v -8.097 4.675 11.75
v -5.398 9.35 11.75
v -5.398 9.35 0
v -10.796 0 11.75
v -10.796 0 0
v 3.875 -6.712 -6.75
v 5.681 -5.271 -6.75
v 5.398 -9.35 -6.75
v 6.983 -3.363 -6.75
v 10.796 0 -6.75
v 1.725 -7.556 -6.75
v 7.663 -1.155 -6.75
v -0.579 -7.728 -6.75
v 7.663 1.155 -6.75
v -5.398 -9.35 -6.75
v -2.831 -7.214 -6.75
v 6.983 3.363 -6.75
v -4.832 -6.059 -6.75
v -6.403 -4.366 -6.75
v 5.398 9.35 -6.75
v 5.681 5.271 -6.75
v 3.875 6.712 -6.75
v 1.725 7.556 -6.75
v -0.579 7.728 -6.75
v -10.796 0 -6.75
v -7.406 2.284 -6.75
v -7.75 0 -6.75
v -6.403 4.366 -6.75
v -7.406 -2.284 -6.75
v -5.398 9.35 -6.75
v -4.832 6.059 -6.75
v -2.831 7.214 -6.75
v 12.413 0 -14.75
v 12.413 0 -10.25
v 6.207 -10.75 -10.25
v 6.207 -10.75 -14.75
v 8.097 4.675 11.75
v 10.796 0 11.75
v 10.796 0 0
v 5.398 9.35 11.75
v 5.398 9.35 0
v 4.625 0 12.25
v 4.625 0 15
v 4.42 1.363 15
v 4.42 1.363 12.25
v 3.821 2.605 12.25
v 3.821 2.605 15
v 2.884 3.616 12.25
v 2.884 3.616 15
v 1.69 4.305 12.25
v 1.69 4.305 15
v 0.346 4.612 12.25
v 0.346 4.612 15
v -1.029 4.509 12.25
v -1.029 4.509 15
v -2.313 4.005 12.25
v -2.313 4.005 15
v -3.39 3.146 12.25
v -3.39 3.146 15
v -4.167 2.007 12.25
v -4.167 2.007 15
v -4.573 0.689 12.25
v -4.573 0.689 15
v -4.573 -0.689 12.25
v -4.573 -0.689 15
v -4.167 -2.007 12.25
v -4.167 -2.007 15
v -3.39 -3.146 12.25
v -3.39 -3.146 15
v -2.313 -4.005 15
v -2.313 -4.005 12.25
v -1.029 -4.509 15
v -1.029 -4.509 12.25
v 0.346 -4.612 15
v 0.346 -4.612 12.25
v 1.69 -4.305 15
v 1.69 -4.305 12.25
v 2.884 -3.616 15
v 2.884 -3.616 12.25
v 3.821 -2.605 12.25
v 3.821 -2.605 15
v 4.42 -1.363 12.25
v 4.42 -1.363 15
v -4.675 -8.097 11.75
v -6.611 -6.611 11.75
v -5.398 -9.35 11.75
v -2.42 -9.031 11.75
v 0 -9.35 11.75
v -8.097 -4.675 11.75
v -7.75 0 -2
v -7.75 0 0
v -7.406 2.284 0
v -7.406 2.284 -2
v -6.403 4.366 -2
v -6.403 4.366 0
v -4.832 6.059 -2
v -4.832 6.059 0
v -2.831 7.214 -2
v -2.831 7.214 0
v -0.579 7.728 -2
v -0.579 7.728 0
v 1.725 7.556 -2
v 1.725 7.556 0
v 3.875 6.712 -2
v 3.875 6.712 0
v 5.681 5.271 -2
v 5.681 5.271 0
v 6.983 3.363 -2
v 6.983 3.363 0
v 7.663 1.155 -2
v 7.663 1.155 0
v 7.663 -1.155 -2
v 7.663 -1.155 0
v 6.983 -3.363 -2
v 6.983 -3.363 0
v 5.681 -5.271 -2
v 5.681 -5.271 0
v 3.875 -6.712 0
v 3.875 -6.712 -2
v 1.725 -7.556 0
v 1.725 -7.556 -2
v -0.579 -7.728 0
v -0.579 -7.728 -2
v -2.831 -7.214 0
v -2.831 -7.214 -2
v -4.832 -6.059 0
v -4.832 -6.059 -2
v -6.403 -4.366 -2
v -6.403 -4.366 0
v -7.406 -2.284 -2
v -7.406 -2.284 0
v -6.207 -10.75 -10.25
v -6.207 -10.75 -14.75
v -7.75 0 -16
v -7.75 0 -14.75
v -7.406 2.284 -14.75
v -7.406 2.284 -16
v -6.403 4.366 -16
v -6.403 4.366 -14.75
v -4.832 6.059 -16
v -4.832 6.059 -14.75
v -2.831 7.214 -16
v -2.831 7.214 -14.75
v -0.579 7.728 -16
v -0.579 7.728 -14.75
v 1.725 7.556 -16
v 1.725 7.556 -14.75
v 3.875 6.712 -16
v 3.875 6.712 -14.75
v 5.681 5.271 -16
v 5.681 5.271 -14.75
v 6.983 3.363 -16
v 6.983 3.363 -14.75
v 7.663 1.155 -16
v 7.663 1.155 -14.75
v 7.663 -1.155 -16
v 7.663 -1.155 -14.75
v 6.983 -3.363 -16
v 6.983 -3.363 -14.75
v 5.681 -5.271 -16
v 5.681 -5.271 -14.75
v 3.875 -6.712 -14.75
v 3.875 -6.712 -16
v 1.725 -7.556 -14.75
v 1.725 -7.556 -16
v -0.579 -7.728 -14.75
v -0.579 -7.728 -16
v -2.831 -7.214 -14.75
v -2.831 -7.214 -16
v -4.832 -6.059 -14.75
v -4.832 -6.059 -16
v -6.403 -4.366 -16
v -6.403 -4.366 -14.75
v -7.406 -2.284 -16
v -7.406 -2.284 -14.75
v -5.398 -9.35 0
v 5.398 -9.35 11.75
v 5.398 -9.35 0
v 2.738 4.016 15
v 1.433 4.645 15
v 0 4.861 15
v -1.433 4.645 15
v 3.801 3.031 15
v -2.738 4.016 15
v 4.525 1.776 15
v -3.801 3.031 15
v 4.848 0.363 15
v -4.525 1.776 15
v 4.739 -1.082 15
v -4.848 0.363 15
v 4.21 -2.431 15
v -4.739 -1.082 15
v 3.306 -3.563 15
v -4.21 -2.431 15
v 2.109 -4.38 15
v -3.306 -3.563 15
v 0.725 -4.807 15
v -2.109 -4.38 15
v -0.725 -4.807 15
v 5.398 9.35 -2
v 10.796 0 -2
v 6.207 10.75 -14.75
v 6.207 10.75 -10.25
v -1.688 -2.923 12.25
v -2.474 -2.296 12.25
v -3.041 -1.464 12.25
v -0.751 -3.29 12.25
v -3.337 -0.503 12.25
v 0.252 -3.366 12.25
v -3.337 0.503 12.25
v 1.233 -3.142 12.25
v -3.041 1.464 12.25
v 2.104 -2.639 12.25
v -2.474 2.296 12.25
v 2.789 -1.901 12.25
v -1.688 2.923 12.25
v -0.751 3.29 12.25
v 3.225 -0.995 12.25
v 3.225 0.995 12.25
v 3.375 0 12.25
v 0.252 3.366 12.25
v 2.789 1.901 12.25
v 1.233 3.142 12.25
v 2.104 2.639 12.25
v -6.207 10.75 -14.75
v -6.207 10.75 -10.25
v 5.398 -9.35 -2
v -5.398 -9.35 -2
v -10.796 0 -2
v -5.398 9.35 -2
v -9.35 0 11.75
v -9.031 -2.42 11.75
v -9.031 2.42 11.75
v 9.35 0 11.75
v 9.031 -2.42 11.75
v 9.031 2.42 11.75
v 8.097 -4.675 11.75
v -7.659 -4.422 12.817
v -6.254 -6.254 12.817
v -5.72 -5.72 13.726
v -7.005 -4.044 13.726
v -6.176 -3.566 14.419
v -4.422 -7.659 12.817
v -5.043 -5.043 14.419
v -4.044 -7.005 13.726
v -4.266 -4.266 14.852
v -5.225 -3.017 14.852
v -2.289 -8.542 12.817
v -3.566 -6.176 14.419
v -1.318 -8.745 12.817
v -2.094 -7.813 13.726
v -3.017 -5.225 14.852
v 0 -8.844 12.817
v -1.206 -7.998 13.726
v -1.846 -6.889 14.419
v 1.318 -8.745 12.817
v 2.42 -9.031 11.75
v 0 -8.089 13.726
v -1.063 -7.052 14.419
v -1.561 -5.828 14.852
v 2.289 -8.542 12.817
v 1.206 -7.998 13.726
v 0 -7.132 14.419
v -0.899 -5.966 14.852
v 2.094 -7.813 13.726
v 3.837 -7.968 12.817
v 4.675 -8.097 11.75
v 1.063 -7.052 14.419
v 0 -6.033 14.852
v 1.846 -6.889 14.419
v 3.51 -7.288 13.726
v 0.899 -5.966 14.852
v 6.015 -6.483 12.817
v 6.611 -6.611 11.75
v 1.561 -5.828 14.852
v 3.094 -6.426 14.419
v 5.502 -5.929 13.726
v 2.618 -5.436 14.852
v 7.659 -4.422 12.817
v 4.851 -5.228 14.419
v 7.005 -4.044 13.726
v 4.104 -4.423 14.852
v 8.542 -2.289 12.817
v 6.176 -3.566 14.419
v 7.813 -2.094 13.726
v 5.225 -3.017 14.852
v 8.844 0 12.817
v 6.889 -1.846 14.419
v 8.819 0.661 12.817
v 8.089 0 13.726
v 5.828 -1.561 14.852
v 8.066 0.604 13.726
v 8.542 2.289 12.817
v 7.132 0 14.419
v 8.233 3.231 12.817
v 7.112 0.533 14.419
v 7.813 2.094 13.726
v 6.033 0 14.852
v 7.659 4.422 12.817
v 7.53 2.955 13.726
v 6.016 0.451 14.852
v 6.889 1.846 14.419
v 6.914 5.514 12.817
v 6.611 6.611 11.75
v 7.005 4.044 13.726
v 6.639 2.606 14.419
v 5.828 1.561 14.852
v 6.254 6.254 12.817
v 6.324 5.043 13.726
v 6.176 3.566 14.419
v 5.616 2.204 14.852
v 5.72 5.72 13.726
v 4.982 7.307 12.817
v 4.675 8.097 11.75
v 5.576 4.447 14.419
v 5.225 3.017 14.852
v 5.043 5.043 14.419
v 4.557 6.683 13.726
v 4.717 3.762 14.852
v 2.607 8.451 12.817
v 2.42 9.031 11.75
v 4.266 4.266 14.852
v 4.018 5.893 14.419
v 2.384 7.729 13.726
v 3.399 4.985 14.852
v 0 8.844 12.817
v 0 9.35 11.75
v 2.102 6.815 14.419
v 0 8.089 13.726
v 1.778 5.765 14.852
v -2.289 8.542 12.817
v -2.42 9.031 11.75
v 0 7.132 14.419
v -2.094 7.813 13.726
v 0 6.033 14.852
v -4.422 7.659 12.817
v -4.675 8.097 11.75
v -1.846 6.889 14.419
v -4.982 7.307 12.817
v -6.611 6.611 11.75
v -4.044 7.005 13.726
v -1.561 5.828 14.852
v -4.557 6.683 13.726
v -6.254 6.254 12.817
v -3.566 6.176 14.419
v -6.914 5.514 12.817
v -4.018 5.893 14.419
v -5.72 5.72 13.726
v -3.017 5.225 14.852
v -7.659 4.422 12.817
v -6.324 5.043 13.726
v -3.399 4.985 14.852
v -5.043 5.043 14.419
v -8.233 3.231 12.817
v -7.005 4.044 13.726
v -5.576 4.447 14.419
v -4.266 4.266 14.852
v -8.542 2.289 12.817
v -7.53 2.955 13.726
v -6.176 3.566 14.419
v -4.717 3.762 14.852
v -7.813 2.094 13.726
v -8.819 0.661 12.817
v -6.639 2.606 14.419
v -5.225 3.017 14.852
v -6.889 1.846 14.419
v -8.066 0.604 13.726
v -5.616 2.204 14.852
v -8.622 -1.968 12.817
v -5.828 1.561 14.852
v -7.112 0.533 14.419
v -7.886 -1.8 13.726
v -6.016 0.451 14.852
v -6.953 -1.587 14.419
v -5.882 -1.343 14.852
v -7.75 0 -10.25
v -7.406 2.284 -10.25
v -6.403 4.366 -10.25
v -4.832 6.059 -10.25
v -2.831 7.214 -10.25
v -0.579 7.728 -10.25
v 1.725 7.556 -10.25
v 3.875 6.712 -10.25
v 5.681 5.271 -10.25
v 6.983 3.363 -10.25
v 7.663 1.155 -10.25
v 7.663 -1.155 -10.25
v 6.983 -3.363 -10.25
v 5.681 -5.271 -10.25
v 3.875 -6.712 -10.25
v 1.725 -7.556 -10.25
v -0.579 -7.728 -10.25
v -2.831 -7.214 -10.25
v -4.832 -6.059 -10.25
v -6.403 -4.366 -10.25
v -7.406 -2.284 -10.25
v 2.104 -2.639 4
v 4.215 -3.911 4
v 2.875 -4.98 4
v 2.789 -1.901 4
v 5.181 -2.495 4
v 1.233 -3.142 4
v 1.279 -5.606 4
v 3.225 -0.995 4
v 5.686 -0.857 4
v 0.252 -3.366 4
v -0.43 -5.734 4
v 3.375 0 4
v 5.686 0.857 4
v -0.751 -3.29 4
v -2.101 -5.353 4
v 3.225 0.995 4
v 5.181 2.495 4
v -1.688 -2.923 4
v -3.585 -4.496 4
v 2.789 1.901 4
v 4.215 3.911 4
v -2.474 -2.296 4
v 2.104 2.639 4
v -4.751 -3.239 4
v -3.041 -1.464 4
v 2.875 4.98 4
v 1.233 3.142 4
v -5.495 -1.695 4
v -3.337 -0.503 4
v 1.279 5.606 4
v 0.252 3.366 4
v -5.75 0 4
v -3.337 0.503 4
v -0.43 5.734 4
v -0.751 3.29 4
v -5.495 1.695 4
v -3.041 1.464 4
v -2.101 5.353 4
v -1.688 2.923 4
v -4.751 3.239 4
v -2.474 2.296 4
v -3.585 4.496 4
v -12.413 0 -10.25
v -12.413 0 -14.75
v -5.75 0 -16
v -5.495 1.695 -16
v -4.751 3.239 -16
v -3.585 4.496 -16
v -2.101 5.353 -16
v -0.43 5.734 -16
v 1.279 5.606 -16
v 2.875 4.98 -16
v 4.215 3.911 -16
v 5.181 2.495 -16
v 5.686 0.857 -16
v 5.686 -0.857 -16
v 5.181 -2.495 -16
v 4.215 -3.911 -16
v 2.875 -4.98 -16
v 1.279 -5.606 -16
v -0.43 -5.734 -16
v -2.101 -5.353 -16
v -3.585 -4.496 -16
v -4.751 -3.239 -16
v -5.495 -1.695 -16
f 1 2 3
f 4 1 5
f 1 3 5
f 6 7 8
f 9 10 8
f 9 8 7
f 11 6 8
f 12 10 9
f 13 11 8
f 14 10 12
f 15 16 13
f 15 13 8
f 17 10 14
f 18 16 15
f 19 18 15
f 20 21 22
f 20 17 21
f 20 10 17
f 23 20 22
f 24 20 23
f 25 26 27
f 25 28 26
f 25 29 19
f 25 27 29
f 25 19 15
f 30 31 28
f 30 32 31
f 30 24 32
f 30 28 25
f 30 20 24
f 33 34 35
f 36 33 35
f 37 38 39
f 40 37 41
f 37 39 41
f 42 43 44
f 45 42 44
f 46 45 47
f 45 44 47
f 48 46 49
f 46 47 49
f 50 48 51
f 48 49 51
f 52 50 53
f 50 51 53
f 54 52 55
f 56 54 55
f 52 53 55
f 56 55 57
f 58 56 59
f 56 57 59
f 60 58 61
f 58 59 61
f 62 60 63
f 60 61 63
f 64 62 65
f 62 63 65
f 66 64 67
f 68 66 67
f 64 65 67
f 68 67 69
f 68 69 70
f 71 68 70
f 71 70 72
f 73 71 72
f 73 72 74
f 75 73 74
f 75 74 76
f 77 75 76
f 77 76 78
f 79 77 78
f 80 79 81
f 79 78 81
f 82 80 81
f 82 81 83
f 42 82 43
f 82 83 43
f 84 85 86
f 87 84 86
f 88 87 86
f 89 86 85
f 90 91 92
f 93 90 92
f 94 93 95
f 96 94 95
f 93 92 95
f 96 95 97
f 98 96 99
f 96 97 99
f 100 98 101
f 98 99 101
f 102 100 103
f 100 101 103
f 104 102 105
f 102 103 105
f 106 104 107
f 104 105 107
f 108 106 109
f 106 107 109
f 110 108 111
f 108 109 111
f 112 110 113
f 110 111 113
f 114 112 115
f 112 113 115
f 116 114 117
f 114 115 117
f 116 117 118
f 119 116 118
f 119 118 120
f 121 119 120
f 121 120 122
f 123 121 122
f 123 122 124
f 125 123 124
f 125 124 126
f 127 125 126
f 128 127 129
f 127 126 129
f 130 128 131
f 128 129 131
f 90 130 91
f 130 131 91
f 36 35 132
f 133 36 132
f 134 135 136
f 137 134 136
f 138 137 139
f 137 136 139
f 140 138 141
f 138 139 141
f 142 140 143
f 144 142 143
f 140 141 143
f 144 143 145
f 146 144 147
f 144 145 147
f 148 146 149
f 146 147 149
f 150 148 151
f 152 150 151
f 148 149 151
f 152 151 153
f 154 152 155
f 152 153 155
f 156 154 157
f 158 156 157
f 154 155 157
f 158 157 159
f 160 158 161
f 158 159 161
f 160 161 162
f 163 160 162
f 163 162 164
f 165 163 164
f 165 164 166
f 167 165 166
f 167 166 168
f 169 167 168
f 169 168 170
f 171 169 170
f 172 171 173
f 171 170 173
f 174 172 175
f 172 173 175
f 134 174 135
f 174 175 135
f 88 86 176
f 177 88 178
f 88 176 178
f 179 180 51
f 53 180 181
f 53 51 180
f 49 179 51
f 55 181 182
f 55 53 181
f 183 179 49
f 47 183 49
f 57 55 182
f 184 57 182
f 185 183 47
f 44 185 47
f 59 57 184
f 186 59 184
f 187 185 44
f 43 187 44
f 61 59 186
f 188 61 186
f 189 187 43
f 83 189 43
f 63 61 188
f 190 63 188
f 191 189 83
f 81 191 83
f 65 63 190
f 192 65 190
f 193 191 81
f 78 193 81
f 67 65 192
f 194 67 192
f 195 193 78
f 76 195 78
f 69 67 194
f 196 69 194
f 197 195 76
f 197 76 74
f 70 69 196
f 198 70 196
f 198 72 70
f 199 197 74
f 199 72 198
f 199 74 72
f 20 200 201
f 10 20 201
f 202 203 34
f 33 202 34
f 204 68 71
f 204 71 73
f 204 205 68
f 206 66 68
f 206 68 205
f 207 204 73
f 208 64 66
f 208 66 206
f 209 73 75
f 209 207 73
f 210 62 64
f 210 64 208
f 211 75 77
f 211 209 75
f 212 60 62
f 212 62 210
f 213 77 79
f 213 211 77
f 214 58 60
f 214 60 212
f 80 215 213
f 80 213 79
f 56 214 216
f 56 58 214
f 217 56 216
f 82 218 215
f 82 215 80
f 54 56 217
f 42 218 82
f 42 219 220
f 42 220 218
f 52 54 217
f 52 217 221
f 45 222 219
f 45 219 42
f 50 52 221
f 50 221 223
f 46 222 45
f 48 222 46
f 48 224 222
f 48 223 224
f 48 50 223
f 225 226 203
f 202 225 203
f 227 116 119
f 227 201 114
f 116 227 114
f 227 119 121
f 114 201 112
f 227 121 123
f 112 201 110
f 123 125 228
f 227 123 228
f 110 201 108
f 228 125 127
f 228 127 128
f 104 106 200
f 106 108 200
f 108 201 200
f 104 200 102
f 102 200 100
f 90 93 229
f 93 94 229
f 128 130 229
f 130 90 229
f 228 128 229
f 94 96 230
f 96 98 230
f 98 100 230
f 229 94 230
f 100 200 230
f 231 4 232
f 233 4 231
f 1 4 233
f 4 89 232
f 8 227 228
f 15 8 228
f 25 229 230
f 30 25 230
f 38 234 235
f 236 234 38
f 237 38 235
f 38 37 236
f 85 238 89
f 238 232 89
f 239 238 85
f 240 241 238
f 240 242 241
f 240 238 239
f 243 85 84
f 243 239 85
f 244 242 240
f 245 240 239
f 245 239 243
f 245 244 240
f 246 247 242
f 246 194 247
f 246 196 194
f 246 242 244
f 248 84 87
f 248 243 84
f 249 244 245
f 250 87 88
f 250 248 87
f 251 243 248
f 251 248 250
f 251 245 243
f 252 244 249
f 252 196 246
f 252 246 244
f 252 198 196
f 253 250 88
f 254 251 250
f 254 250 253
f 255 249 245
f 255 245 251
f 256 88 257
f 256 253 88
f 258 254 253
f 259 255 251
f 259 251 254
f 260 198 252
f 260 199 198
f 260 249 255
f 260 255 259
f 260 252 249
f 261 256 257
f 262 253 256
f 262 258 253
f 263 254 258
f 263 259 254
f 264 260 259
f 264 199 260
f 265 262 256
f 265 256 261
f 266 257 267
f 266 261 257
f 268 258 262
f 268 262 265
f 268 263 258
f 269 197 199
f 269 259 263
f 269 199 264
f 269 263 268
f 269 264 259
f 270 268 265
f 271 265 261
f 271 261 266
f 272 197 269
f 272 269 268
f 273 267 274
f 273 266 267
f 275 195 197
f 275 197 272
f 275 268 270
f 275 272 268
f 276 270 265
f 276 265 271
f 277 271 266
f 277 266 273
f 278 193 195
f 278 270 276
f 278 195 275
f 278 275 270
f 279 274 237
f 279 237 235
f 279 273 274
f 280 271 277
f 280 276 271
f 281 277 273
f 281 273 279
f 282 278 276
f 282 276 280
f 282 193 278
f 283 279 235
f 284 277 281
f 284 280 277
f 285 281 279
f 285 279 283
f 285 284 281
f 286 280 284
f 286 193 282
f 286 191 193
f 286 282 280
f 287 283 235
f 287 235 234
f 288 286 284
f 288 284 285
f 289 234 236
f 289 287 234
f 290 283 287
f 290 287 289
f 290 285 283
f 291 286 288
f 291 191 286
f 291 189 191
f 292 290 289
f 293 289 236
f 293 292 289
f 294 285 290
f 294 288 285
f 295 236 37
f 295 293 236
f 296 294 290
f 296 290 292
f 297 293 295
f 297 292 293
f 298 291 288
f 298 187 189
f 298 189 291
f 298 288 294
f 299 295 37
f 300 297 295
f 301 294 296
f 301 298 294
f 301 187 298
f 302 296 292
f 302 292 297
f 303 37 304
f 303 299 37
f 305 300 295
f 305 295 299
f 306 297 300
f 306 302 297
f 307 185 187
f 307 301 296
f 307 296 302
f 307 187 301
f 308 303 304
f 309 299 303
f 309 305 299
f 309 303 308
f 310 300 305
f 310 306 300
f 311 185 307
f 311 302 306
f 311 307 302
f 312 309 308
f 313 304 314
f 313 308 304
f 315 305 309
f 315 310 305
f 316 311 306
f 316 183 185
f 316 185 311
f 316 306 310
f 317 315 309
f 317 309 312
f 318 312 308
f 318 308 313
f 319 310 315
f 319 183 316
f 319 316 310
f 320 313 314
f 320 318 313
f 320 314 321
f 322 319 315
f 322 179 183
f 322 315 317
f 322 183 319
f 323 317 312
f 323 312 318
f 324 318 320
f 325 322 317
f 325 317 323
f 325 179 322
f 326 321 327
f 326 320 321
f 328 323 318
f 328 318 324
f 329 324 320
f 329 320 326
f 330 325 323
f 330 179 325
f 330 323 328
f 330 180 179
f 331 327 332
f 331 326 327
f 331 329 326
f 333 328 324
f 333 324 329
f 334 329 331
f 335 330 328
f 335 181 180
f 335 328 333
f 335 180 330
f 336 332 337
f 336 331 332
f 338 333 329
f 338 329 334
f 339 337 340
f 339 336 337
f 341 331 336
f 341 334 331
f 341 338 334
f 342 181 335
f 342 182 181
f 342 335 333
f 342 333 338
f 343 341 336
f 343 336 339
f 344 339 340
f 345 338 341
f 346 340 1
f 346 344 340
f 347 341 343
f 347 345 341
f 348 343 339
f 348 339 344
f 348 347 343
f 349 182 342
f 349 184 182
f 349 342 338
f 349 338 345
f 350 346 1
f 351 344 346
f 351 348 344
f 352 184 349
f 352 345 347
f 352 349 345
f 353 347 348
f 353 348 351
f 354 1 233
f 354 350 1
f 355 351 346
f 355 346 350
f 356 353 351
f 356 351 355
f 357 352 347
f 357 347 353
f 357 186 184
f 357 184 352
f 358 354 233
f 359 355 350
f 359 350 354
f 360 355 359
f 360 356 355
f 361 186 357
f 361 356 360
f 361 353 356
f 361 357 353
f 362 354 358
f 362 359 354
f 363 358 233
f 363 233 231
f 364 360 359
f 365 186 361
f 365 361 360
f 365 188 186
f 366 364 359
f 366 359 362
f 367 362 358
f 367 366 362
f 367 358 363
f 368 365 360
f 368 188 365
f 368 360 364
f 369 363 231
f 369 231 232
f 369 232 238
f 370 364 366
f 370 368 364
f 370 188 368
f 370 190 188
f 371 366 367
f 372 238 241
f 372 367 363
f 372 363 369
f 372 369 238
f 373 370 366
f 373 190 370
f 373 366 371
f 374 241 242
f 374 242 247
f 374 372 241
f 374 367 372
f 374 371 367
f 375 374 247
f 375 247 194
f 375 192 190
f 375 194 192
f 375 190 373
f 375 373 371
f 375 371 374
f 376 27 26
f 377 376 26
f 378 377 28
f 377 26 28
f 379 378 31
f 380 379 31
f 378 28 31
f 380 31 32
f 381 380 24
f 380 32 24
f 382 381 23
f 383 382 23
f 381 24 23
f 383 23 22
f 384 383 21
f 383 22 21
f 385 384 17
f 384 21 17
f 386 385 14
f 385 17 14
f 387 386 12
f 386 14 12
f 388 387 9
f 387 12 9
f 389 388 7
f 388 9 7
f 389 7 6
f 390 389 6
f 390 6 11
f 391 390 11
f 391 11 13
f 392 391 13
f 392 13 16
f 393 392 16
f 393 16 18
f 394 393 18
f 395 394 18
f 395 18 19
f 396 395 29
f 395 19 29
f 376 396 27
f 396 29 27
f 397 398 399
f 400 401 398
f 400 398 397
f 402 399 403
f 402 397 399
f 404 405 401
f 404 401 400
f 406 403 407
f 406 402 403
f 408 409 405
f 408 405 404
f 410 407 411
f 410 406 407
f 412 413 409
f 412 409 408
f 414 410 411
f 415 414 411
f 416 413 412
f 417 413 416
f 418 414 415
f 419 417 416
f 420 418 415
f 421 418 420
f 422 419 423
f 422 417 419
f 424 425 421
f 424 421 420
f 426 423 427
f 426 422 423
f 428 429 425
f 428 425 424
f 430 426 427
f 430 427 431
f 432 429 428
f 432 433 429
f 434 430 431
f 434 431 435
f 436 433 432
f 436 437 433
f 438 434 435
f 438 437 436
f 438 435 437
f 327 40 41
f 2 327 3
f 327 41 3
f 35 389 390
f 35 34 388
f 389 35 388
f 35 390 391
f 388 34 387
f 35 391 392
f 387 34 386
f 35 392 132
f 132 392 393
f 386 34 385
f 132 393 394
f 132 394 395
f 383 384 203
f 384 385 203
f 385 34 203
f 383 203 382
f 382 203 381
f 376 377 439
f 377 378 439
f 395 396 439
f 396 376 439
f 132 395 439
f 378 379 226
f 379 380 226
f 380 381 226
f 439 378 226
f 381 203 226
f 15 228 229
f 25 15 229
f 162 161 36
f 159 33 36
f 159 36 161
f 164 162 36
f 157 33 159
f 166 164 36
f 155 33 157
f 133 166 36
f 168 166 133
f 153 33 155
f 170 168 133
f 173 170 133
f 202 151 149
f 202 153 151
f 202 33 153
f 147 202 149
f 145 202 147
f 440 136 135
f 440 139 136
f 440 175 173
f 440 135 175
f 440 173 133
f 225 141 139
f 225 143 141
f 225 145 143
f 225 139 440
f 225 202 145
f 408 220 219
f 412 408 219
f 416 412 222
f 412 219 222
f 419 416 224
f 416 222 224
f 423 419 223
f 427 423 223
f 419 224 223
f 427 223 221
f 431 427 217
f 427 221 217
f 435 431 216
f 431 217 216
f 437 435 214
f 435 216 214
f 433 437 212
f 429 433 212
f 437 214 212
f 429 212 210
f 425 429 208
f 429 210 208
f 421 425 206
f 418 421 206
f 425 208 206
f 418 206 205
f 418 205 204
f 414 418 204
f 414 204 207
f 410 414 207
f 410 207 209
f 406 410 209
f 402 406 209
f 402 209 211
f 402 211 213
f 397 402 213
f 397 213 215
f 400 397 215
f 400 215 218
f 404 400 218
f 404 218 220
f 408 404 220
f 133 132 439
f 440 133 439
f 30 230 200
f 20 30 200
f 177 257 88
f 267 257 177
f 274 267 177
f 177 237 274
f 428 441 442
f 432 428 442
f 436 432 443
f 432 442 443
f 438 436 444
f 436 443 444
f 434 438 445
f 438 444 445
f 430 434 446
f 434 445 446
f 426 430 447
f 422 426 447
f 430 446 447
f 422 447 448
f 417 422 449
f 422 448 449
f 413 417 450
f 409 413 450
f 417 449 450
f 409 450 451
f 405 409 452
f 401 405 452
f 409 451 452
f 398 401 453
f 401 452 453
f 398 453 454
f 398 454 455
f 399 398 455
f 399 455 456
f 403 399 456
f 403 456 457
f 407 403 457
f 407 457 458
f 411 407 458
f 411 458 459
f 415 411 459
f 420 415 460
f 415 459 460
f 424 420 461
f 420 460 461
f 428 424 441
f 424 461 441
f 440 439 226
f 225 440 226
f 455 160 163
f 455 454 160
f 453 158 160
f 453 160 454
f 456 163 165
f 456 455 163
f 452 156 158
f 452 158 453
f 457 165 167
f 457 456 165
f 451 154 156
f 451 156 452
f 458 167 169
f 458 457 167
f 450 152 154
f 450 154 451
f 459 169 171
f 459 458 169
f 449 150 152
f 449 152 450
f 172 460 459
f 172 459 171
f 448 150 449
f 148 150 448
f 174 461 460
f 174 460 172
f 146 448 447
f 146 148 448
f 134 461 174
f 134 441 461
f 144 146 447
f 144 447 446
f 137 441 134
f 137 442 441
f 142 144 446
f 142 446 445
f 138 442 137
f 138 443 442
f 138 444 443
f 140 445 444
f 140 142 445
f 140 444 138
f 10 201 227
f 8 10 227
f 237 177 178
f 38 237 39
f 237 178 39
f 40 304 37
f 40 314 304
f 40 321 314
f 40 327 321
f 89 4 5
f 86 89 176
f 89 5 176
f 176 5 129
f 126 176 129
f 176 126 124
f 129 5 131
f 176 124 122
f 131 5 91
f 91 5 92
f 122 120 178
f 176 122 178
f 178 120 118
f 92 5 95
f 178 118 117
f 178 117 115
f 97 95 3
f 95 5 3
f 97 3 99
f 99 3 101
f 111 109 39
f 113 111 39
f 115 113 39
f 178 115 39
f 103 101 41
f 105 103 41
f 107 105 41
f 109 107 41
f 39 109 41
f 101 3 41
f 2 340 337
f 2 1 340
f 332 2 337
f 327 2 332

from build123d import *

# Parameters (mm, degrees)
BOSS_EXTRUDE1_DEPTH = 11.75
SKETCH2_R           = 7.75
BOSS_EXTRUDE2_DEPTH = 2
BOSS_EXTRUDE3_DEPTH = 4.75
SKETCH4_R           = 7.75
BOSS_EXTRUDE4_DEPTH = 3.5
BOSS_EXTRUDE5_DEPTH = 4.5
SKETCH6_R           = 7.75
BOSS_EXTRUDE6_DEPTH = 1.25
SKETCH7_R           = 5.75
CUT_EXTRUDE1_DEPTH  = 20
SKETCH8_R           = 9.35
BOSS_EXTRUDE7_DEPTH = 3.25
SKETCH9_R           = 4.625
CUT_EXTRUDE2_DEPTH  = 2.75
FILLET2_R           = 4.725
SKETCH10_R          = 3.375
CUT_EXTRUDE3_DEPTH  = 33.675806544


with BuildPart() as part:
    # Sketch1 → Boss-Extrude1 (new body)
    with BuildSketch(Plane.XY):
        Polygon((10.796450034, 0), (5.398225017, 9.35), (-5.398225017, 9.35), (-10.796450034, 0), (-5.398225017, -9.35), (5.398225017, -9.35), align=None)
    extrude(amount=BOSS_EXTRUDE1_DEPTH)

    # Sketch2 → Boss-Extrude2 (add)
    with BuildSketch(Plane(origin=(0, 0, 0), x_dir=(-1, 0, 0), z_dir=(0, 0, -1))):
        Circle(SKETCH2_R)
    extrude(amount=BOSS_EXTRUDE2_DEPTH)

    # Sketch3 → Boss-Extrude3 (add)
    with BuildSketch(Plane(origin=(0, 0, -2), x_dir=(-1, 0, 0), z_dir=(0, 0, -1))):
        Polygon((10.796450034, 0), (5.398225017, 9.35), (-5.398225017, 9.35), (-10.796450034, 0), (-5.398225017, -9.35), (5.398225017, -9.35), align=None)
    extrude(amount=BOSS_EXTRUDE3_DEPTH)

    # Sketch4 → Boss-Extrude4 (add)
    with BuildSketch(Plane(origin=(0, 0, -6.75), x_dir=(-1, 0, 0), z_dir=(0, 0, -1))):
        Circle(SKETCH4_R)
    extrude(amount=BOSS_EXTRUDE4_DEPTH)

    # Sketch5 → Boss-Extrude5 (add)
    with BuildSketch(Plane(origin=(0, 0, -10.25), x_dir=(-1, 0, 0), z_dir=(0, 0, -1))):
        Polygon((12.413030788, 0), (6.206515394, 10.75), (-6.206515394, 10.75), (-12.413030788, 0), (-6.206515394, -10.75), (6.206515394, -10.75), align=None)
    extrude(amount=BOSS_EXTRUDE5_DEPTH)

    # Sketch6 → Boss-Extrude6 (add)
    with BuildSketch(Plane(origin=(0, 0, -14.75), x_dir=(-1, 0, 0), z_dir=(0, 0, -1))):
        Circle(SKETCH6_R)
    extrude(amount=BOSS_EXTRUDE6_DEPTH)

    # Sketch7 → Cut-Extrude1 (cut)
    with BuildSketch(Plane(origin=(0, 0, -16), x_dir=(-1, 0, 0), z_dir=(0, 0, -1))):
        Circle(SKETCH7_R)
    extrude(amount=-CUT_EXTRUDE1_DEPTH, mode=Mode.SUBTRACT)

    # Sketch8 → Boss-Extrude7 (add)
    with BuildSketch(Plane.XY.offset(11.75)):
        with Locations(Location((0, 0, 0), (0, 0, 210))):
            Circle(SKETCH8_R)
    extrude(amount=BOSS_EXTRUDE7_DEPTH)

    # Sketch9 → Cut-Extrude2 (cut)
    with BuildSketch(Plane.XY.offset(15)):
        Circle(SKETCH9_R)
    extrude(amount=-CUT_EXTRUDE2_DEPTH, mode=Mode.SUBTRACT)

    # Fillet2
    # the kernel refuses this fillet: 4.725 mm, written as the material it takes off along each edge
    with BuildSketch(Plane(origin=(0, 0, 15), x_dir=(-0.8660254037844385, -0.5000000000000001, 0), z_dir=(-0.5000000000000001, 0.8660254037844385, 0))) as fillet2_piece_1:
        with BuildLine():
            CenterArc((4.861124863, -4.725), FILLET2_R, 18.190012051, 71.809987949)
            Line((4.861124863, 0), (4.861124863, 0.0945))
            Line((4.861124863, 0.0945), (9.35, 0.0945))
            Line((9.35, 0.0945), (9.4445, 0))
            ThreePointArc((9.4445, 0), (9.4445, -1.625), (9.439777503, -3.2205))
            Line((9.439777503, -3.2205), (9.35, -3.25))
        make_face()
    revolve(axis=Axis((0, 0, 15), (0, 0, 1)), mode=Mode.SUBTRACT)

    # Sketch10 → Cut-Extrude3 (cut, through all)
    with BuildSketch(Plane.XY.offset(12.25)):
        Circle(SKETCH10_R)
    extrude(amount=-CUT_EXTRUDE3_DEPTH, mode=Mode.SUBTRACT)


solid = part.part
